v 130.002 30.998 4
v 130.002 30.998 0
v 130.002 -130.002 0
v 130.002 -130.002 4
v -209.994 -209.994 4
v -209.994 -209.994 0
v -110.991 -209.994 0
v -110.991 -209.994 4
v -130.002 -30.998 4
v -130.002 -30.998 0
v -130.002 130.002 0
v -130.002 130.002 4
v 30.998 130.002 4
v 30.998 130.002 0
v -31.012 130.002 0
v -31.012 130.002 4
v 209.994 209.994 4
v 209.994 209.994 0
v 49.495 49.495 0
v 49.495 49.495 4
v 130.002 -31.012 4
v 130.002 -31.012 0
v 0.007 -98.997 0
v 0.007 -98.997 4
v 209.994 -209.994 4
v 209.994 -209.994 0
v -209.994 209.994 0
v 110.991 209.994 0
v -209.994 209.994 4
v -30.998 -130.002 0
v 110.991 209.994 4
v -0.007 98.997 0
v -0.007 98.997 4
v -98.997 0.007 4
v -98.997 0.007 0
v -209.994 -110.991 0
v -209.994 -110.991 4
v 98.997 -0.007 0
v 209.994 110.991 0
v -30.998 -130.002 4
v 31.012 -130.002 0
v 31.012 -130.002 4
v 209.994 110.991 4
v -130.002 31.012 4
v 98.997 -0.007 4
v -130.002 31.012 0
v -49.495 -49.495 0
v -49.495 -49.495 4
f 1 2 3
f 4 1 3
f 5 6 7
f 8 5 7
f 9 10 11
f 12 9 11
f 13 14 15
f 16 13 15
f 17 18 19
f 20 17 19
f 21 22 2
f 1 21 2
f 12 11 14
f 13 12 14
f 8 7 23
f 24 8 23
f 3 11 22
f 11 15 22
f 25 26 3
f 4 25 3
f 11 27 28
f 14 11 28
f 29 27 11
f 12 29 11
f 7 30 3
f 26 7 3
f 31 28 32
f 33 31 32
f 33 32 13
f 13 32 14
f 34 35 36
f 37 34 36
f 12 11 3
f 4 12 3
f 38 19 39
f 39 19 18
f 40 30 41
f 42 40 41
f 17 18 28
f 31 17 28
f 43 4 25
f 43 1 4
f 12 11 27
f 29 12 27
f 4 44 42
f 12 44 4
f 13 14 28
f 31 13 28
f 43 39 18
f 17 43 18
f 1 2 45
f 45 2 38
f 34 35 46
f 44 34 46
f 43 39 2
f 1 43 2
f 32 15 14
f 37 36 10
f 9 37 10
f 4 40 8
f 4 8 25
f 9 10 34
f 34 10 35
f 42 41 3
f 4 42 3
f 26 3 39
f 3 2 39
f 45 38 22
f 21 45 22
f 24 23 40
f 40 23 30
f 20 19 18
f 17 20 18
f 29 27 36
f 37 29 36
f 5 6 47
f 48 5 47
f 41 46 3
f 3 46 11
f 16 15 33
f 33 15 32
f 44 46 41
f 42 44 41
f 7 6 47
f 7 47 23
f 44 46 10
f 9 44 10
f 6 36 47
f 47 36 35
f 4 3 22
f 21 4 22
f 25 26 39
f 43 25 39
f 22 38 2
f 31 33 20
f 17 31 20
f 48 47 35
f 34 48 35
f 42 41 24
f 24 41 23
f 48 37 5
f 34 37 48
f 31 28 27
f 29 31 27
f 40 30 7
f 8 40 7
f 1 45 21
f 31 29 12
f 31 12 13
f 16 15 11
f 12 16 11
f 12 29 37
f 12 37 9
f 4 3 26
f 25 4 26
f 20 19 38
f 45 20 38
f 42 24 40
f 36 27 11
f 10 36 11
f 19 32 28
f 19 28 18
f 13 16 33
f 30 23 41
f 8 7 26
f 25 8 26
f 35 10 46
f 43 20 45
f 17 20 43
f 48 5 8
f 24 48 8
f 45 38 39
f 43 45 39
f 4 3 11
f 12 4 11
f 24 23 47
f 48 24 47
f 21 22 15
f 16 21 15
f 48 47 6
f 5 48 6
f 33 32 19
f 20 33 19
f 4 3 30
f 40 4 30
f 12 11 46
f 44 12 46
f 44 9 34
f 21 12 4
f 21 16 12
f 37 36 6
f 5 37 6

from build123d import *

# Parameters (mm, degrees)
F2_DEPTH = 4
F3_DEPTH = 4
F4_DEPTH = 4
F5_DEPTH = 4


with BuildPart() as f2:
    # F1 (on Top) → F2 (new body)
    with BuildSketch(Plane.XY):
        Polygon((-130.0015817211, 31.0115817211), (-130.0015817211, 130.0015817211), (-209.9940971937, 209.9940971937), (-209.9940971937, -110.9909337514), (-130.0015817211, -30.9984182789), align=None)
    extrude(amount=F2_DEPTH)


with BuildPart() as f2b:
    # F1 (on Top) → F2, piece 2 (new body)
    with BuildSketch(Plane.XY):
        Polygon((130.0015817211, -31.0115817211), (130.0015817211, -130.0015817211), (209.9940971937, -209.9940971937), (209.9940971937, 110.9909337514), (130.0015817211, 30.9984182789), align=None)
    extrude(amount=F2_DEPTH)


with BuildPart() as f2c:
    # F1 (on Top) → F2, piece 3 (new body)
    with BuildSketch(Plane.XY):
        Polygon((-209.9940971937, -209.9940971937), (-110.9909337514, -209.9940971937), (-30.9984182789, -130.0015817211), (0.0065817211, -98.9965817211), (-49.495, -49.495), align=None)
    extrude(amount=F2_DEPTH)


with BuildPart() as f2d:
    # F1 (on Top) → F2, piece 4 (new body)
    with BuildSketch(Plane.XY):
        Polygon((110.9909337514, 209.9940971937), (30.9984182789, 130.0015817211), (-0.0065817211, 98.9965817211), (49.495, 49.495), (209.9940971937, 209.9940971937), align=None)
    extrude(amount=F2_DEPTH)


with BuildPart() as f3:
    # F1 (on Top) → F3 (new body)
    with BuildSketch(Plane.XY):
        Polygon((-209.9940971937, 209.9940971937), (-130.0015817211, 130.0015817211), (-31.0115817211, 130.0015817211), (30.9984182789, 130.0015817211), (110.9909337514, 209.9940971937), align=None)
    extrude(amount=F3_DEPTH)


with BuildPart() as f3b:
    # F1 (on Top) → F3, piece 2 (new body)
    with BuildSketch(Plane.XY):
        Polygon((-98.9965817211, 0.0065817211), (-130.0015817211, -30.9984182789), (-209.9940971937, -110.9909337514), (-209.9940971937, -209.9940971937), (-49.495, -49.495), align=None)
    extrude(amount=F3_DEPTH)


with BuildPart() as f3c:
    # F1 (on Top) → F3, piece 3 (new body)
    with BuildSketch(Plane.XY):
        Polygon((130.0015817211, 30.9984182789), (209.9940971937, 110.9909337514), (209.9940971937, 209.9940971937), (49.495, 49.495), (98.9965817211, -0.0065817211), align=None)
    extrude(amount=F3_DEPTH)


with BuildPart() as f3d:
    # F1 (on Top) → F3, piece 4 (new body)
    with BuildSketch(Plane.XY):
        Polygon((209.9940971937, -209.9940971937), (130.0015817211, -130.0015817211), (31.0115817211, -130.0015817211), (-30.9984182789, -130.0015817211), (-110.9909337514, -209.9940971937), align=None)
    extrude(amount=F3_DEPTH)


with BuildPart() as f4:
    # F1 (on Top) → F4 (new body)
    with BuildSketch(Plane.XY):
        Polygon((130.0015817211, -130.0015817211), (0, 0), (-130.0015817211, 130.0015817211), (-130.0015817211, 31.0115817211), (-98.9965817211, 0.0065817211), (-49.495, -49.495), (0.0065817211, -98.9965817211), (31.0115817211, -130.0015817211), align=None)
    extrude(amount=F4_DEPTH)


with BuildPart() as f4b:
    # F1 (on Top) → F4, piece 2 (new body)
    with BuildSketch(Plane.XY):
        Polygon((30.9984182789, 130.0015817211), (-31.0115817211, 130.0015817211), (-0.0065817211, 98.9965817211), align=None)
    extrude(amount=F4_DEPTH)


with BuildPart() as f4c:
    # F1 (on Top) → F4, piece 3 (new body)
    with BuildSketch(Plane.XY):
        Polygon((98.9965817211, -0.0065817211), (130.0015817211, -31.0115817211), (130.0015817211, 30.9984182789), align=None)
    extrude(amount=F4_DEPTH)


with BuildPart() as f5:
    # F1 (on Top) → F5 (new body)
    with BuildSketch(Plane.XY):
        Polygon((-98.9965817211, 0.0065817211), (-130.0015817211, 31.0115817211), (-130.0015817211, -30.9984182789), align=None)
    extrude(amount=F5_DEPTH)


with BuildPart() as f5b:
    # F1 (on Top) → F5, piece 2 (new body)
    with BuildSketch(Plane.XY):
        Polygon((-130.0015817211, 130.0015817211), (0, 0), (130.0015817211, -130.0015817211), (130.0015817211, -31.0115817211), (98.9965817211, -0.0065817211), (49.495, 49.495), (-0.0065817211, 98.9965817211), (-31.0115817211, 130.0015817211), align=None)
    extrude(amount=F5_DEPTH)


with BuildPart() as f5c:
    # F1 (on Top) → F5, piece 3 (new body)
    with BuildSketch(Plane.XY):
        Polygon((-30.9984182789, -130.0015817211), (31.0115817211, -130.0015817211), (0.0065817211, -98.9965817211), align=None)
    extrude(amount=F5_DEPTH)


solid = Compound([f2.part, f2b.part, f2c.part, f2d.part, f3.part, f3b.part, f3c.part, f3d.part, f4.part, f4b.part, f4c.part, f5.part, f5b.part, f5c.part])
